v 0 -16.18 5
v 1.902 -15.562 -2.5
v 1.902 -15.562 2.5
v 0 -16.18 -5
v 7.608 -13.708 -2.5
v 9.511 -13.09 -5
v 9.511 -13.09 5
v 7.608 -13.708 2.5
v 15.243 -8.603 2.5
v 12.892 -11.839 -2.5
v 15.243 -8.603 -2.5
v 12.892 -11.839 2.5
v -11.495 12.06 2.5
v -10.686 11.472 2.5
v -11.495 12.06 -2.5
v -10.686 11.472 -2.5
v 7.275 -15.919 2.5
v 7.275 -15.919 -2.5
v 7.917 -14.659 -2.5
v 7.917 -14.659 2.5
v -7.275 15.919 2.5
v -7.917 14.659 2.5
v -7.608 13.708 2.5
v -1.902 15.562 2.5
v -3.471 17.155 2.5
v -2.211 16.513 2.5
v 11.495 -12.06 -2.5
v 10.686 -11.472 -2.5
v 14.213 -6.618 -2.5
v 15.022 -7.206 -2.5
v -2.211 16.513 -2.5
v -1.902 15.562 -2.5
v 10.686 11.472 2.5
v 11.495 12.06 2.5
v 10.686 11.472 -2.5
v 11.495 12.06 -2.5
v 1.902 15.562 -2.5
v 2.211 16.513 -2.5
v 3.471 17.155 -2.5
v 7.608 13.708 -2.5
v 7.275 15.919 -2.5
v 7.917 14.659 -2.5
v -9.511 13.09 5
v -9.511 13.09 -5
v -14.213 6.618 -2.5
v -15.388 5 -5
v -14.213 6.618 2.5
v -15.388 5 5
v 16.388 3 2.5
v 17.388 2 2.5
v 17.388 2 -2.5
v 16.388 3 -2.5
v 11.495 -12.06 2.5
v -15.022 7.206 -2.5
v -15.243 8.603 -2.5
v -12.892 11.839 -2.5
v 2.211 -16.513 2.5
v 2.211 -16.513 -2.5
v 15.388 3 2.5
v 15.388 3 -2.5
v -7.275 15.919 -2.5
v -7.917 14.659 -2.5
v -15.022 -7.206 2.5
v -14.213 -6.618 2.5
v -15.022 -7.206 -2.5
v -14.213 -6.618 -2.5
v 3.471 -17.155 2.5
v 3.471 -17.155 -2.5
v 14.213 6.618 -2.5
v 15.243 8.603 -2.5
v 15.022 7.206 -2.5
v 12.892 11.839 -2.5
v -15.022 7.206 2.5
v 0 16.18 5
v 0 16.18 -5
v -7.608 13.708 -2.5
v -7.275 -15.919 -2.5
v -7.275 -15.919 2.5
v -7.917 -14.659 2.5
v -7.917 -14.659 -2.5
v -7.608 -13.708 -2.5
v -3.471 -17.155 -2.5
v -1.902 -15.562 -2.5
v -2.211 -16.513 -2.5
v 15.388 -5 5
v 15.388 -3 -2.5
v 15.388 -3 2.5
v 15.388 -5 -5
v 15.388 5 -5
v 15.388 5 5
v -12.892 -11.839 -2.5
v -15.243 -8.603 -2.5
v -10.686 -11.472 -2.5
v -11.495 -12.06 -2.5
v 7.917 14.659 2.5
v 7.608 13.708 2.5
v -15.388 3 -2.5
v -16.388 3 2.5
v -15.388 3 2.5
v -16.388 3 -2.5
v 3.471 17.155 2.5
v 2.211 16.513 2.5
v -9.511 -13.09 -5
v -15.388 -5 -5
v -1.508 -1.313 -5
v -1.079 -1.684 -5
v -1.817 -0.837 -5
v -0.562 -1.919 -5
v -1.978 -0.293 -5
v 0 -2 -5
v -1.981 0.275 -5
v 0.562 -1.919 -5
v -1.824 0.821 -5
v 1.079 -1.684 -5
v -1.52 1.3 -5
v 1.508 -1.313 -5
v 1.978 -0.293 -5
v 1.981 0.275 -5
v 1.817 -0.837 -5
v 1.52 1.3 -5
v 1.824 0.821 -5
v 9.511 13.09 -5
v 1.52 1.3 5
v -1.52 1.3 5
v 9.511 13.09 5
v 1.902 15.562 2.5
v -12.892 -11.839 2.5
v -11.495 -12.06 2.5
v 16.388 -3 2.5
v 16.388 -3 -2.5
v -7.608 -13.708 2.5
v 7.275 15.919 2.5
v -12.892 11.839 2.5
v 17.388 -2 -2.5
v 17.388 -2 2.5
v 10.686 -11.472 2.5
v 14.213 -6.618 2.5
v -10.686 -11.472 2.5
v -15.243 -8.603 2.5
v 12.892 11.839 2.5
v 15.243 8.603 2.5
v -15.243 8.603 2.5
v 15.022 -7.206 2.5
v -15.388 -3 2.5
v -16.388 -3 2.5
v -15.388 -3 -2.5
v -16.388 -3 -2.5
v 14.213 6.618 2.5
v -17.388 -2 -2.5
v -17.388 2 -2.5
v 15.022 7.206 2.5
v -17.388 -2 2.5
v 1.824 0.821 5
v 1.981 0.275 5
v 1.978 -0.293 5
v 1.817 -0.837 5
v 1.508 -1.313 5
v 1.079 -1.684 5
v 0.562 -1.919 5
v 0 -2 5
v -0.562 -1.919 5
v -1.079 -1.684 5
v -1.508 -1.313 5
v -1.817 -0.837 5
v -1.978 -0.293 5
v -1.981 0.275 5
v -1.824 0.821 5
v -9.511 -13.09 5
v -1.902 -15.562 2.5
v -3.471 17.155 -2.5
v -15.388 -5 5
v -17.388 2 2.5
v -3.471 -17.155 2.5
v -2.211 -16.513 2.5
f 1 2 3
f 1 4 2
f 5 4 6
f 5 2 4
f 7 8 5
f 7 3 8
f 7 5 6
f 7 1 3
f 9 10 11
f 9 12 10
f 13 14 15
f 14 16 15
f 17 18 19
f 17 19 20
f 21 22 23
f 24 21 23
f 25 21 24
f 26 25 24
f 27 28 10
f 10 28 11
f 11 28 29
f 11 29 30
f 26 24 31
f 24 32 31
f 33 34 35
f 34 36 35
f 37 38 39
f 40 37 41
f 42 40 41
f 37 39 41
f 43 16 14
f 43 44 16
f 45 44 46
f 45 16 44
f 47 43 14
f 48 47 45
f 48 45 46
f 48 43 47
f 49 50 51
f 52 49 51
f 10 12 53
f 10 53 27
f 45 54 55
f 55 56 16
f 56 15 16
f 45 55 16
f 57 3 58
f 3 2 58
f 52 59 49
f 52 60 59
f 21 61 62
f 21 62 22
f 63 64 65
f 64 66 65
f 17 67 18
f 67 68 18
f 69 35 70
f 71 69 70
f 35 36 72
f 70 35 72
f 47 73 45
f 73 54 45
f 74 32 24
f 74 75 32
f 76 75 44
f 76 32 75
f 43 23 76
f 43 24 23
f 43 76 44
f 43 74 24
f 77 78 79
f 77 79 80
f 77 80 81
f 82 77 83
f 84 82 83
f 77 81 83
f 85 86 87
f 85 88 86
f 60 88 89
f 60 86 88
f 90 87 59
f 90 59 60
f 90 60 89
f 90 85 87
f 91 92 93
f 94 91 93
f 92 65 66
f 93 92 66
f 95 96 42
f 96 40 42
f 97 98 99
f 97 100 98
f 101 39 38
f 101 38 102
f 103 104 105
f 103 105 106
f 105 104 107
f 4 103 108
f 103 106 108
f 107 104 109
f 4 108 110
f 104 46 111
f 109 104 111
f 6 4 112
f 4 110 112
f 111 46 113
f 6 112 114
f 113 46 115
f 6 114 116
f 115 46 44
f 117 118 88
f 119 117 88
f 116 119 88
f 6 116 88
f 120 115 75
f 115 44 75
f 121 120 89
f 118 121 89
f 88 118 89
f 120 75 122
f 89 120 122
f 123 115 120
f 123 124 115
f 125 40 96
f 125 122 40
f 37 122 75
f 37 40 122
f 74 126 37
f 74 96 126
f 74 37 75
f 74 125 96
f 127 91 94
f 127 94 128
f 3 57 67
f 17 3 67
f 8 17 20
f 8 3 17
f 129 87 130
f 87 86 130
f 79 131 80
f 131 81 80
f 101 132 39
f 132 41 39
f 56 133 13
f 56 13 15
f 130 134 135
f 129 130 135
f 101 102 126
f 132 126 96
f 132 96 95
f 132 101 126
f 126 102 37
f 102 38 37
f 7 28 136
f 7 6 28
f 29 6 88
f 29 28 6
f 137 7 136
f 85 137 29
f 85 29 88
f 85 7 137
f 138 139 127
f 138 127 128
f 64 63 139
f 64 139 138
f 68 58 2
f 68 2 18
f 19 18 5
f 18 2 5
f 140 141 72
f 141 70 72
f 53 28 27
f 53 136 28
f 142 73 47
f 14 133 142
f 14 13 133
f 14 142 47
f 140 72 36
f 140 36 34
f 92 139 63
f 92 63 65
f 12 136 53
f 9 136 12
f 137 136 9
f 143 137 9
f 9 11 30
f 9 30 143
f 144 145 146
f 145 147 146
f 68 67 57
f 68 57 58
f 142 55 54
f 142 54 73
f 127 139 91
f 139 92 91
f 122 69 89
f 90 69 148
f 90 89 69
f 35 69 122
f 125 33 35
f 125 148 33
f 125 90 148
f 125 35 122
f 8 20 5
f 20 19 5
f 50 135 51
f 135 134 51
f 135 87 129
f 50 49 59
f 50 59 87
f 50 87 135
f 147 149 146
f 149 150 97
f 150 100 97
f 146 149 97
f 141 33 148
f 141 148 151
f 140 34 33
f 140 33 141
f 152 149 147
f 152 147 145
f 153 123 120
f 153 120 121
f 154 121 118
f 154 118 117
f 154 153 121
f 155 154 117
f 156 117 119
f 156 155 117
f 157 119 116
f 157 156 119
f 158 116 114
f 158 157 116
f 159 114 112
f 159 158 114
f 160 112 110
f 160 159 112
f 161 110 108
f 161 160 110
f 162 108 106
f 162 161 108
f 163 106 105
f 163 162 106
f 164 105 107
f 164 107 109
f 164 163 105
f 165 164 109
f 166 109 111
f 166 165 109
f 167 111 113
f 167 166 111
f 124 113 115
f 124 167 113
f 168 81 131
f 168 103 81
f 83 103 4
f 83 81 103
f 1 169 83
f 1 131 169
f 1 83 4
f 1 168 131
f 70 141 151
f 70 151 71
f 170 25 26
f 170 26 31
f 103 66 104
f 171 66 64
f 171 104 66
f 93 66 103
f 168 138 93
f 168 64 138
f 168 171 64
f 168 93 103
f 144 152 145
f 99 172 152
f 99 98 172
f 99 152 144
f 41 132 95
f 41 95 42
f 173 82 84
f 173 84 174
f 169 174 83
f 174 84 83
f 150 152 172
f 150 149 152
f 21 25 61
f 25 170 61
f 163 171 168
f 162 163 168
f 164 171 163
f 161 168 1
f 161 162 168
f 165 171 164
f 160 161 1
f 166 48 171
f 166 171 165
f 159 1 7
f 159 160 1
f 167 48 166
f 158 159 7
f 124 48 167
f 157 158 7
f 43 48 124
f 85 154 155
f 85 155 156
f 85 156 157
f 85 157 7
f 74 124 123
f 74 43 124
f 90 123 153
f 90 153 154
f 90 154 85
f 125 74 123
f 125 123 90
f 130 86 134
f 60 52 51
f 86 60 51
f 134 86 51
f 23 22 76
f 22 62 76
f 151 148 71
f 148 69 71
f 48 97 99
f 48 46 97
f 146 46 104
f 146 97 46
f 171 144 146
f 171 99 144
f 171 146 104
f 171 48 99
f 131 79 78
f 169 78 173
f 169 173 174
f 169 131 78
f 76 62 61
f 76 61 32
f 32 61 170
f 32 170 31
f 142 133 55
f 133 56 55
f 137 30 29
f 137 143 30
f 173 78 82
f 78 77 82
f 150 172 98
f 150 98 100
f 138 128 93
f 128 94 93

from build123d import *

# Parameters (mm, degrees)
F1_DEPTH = 5
F2_W     = 2
F2_H     = 6
F3_DEPTH = 2.5
F4_SIZE  = 1


with BuildPart() as f1:
    # F0 (on Top) → F1 (new body, symmetric)
    with BuildSketch(Plane.XY):
        Polygon((15.3884176859, 5), (9.510565163, 13.0901699437), (0, 16.1803398875), (-9.510565163, 13.0901699437), (-15.3884176859, 5), (-15.3884176859, -5), (-9.510565163, -13.0901699437), (0, -16.1803398875), (9.510565163, -13.0901699437), (15.3884176859, -5), align=None)
        with BuildLine():
            ThreePointArc((1.5198684154, 1.3), (0, -2), (-1.5198684154, 1.3))
            Line((-1.5198684154, 1.3), (1.5198684154, 1.3))
        make_face(mode=Mode.SUBTRACT)
    extrude(amount=F1_DEPTH, both=True)

    # F2 (on Top) → F3 (join, symmetric)
    with BuildSketch(Plane.XY):
        with Locations((16.3884176859, 0)):
            Rectangle(F2_W, F2_H)
        Polygon((15.83088117, 7.7936044933), (12.3041696563, 12.6477064596), (10.6861356675, 11.472135955), (14.2128471813, 6.6180339887), align=None)
        Polygon((8.2264861191, 15.6103169651), (2.5201470213, 17.4644189313), (1.9021130326, 15.5623058987), (7.6084521304, 13.7082039325), align=None)
        Polygon((-2.5201470213, 17.4644189313), (-8.2264861191, 15.6103169651), (-7.6084521304, 13.7082039325), (-1.9021130326, 15.5623058987), align=None)
        Polygon((-12.3041696563, 12.6477064596), (-15.83088117, 7.7936044933), (-14.2128471813, 6.6180339887), (-10.6861356675, 11.472135955), align=None)
        with Locations((-16.3884176859, 0)):
            Rectangle(F2_W, F2_H)
        Polygon((-15.83088117, -7.7936044933), (-12.3041696563, -12.6477064596), (-10.6861356675, -11.472135955), (-14.2128471813, -6.6180339887), align=None)
        Polygon((-8.2264861191, -15.6103169651), (-2.5201470213, -17.4644189313), (-1.9021130326, -15.5623058987), (-7.6084521304, -13.7082039325), align=None)
        Polygon((2.5201470213, -17.4644189313), (8.2264861191, -15.6103169651), (7.6084521304, -13.7082039325), (1.9021130326, -15.5623058987), align=None)
        Polygon((12.3041696563, -12.6477064596), (15.83088117, -7.7936044933), (14.2128471813, -6.6180339887), (10.6861356675, -11.472135955), align=None)
    extrude(amount=F3_DEPTH, both=True)

    # F4
    f4_edges = [f1.edges().sort_by_distance(p)[0] for p in [
        (12.30417, -12.647706, 0),
        (15.830881, -7.793604, 0),
        (17.388418, -3, 0),
        (17.388418, 3, 0),
        (15.830881, 7.793604, 0),
        (12.30417, 12.647706, 0),
        (8.226486, 15.610317, 0),
        (2.520147, 17.464419, 0),
        (-2.520147, 17.464419, 0),
        (-8.226486, 15.610317, 0),
        (-12.30417, 12.647706, 0),
        (-15.830881, 7.793604, 0),
        (-17.388418, 3, 0),
        (-17.388418, -3, 0),
        (-15.830881, -7.793604, 0),
        (-12.30417, -12.647706, 0),
        (-2.520147, -17.464419, 0),
        (-8.226486, -15.610317, 0),
        (8.226486, -15.610317, 0),
        (2.520147, -17.464419, 0),
    ]]
    chamfer(f4_edges, length=F4_SIZE)


solid = f1.part
